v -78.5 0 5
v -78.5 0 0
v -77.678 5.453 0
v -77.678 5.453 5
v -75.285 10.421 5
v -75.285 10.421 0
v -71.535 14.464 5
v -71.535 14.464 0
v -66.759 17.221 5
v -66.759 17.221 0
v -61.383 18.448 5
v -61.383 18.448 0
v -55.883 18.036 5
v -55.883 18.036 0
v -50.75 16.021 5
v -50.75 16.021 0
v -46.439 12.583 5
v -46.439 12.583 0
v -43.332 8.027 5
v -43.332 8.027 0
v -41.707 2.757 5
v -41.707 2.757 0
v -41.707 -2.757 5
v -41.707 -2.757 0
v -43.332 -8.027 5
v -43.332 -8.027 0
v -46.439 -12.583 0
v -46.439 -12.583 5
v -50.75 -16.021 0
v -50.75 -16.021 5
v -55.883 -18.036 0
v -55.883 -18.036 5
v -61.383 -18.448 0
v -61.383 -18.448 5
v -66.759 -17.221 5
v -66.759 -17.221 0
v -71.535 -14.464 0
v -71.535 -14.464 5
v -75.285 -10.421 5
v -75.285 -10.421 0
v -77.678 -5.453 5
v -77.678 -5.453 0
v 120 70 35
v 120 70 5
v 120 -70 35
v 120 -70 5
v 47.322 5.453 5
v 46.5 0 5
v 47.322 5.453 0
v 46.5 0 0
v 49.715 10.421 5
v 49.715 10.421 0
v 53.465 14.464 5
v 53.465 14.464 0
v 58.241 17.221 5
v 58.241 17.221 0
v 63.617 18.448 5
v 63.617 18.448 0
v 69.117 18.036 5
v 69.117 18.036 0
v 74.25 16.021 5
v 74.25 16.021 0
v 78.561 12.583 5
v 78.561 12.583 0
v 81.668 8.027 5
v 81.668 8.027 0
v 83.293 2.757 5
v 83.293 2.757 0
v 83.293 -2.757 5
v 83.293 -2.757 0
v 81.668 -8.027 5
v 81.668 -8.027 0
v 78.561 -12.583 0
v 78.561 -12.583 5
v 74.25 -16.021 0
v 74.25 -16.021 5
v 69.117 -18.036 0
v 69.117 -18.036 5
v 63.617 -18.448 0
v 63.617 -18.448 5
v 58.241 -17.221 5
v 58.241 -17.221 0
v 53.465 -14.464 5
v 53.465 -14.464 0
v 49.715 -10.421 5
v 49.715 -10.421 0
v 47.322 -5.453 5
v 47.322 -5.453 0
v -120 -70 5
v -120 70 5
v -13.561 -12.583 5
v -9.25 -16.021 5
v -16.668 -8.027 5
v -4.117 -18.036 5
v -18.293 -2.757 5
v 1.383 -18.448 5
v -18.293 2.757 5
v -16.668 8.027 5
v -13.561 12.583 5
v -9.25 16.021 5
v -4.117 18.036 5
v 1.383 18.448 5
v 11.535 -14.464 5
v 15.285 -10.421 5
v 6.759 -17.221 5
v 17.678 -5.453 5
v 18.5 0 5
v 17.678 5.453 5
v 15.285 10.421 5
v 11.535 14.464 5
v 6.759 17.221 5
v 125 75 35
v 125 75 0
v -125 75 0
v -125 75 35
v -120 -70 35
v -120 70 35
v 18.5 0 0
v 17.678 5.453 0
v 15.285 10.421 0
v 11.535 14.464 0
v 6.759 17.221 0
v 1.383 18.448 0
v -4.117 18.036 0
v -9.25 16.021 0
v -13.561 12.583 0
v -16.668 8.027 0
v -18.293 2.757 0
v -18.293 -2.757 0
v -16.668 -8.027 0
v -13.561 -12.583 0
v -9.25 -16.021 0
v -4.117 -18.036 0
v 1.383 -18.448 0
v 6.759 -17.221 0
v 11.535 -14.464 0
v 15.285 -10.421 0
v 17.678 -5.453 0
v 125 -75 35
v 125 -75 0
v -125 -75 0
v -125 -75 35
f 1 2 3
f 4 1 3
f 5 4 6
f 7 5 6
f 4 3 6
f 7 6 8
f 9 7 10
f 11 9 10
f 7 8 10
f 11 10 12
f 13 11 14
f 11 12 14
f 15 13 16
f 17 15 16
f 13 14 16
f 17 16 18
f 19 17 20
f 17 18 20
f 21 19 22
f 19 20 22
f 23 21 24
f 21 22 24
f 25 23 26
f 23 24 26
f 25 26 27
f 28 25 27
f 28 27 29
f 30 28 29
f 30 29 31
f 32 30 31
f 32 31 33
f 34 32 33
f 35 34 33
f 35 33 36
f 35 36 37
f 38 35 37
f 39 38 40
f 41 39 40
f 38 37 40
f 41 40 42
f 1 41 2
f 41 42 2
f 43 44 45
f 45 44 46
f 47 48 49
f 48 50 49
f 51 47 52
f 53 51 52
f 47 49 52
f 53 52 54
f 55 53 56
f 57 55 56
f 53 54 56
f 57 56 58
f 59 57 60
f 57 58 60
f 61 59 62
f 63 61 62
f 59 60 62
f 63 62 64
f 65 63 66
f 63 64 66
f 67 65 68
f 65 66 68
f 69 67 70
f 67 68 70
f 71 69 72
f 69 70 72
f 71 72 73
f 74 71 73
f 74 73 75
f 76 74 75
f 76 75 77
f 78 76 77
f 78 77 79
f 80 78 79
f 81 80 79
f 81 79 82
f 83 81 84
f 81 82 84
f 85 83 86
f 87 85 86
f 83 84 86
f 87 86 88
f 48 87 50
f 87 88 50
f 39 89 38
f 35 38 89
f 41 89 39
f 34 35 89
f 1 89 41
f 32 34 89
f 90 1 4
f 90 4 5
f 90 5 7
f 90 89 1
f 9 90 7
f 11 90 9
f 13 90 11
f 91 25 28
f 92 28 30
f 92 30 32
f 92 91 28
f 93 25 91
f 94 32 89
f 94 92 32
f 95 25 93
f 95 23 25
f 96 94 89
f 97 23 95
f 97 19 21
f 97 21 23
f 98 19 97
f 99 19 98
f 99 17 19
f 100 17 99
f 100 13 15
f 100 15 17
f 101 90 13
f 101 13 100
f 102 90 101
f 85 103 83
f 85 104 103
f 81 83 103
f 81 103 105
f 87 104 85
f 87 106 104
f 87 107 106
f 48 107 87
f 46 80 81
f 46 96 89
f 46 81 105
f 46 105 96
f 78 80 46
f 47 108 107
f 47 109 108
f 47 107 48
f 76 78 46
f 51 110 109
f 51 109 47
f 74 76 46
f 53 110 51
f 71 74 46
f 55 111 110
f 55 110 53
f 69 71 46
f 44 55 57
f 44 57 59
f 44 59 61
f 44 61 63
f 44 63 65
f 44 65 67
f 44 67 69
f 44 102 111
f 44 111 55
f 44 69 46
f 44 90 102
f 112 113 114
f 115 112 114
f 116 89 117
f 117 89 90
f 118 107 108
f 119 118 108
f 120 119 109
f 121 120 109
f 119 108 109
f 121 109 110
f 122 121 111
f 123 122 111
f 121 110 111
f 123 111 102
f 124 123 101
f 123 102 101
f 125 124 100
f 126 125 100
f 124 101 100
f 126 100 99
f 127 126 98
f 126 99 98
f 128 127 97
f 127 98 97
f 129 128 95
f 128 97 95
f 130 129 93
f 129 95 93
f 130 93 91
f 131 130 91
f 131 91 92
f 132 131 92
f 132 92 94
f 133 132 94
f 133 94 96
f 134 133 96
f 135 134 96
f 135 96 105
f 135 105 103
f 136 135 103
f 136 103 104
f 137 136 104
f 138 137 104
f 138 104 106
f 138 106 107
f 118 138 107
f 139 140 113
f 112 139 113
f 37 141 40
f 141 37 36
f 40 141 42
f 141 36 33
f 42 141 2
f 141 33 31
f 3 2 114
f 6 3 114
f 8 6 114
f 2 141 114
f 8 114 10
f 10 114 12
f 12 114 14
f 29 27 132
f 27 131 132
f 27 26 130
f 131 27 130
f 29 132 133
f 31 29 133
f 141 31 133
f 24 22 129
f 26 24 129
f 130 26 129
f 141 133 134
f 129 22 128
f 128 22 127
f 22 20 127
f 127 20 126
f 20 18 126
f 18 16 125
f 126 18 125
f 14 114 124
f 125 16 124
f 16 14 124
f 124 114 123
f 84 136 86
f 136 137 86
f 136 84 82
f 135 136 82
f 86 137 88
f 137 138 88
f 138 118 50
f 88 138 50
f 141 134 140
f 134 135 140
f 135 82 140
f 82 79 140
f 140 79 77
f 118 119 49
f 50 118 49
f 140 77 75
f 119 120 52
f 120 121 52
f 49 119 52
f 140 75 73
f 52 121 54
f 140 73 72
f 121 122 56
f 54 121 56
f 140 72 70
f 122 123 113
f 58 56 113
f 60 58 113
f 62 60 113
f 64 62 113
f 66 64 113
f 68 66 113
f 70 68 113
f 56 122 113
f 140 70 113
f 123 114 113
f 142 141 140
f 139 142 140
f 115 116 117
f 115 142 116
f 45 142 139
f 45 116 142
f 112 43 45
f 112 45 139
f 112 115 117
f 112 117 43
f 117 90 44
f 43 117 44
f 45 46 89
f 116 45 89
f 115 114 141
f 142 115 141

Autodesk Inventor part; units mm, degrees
ref_plane "YZ Plane" through (0, 0, 0) normal (1, 0, 0) x (0, 1, 0)
ref_plane "XZ Plane" through (0, 0, 0) normal (0, 1, 0) x (-1, 0, 0)
ref_plane "XY Plane" through (0, 0, 0) normal (0, 0, 1) x (1, 0, 0)
sketch "Sketch1" plane through (0, 0, 0) normal (0, 0, 1) x (1, 0, 0)
  line L0 (-125, -75) -> (125, -75)
  line L1 (125, -75) -> (125, 75)
  line L2 (125, 75) -> (-125, 75)
  line L3 (-125, 75) -> (-125, -75)
  line L4 (-125, -75) -> (125, 75) construction
  line L5 (125, -75) -> (-125, 75) construction
  point P0 (0, 0)
  dimension "d0" = 250
  dimension "d1" = 150
extrude "Extrusion1" add sketch "Sketch1" along normal blind 5
sketch "Sketch2" plane through (0, 0, 5) normal (0, 0, 1) x (1, 0, 0)
  line L0 (125, -75) -> (125, 75) projected
  line L1 (125, 75) -> (-125, 75) projected
  line L2 (-125, 75) -> (-125, -75) projected
  line L3 (-125, -75) -> (125, -75) projected
  line L4 (-120, 70) -> (120, 70)
  line L5 (120, 70) -> (120, -70)
  line L6 (120, -70) -> (-120, -70)
  line L7 (-120, -70) -> (-120, 70)
  point P0 (0, 0)
  dimension "d4" = 5
extrude "Extrusion2" add sketch "Sketch2" along normal blind 30
sketch "Sketch3" plane through (0, 0, 5) normal (0, 0, 1) x (1, 0, 0)
  line L0 (-120, 70) -> (-120, -70) projected
  line L1 (-120, -70) -> (120, -70) projected
  line L2 (120, -70) -> (120, 70) projected
  line L3 (120, 70) -> (-120, 70) projected
  circle A0 centre (0, 0) radius 18.5
  dimension "d8" = 37
extrude "Extrusion3" cut sketch "Sketch3" against normal through all contours A0
sketch "Sketch4" plane through (0, 0, 0) normal (0, 0, -1) x (-1, 0, 0)
  circle A0 centre (-65, 0) radius 18.5
  circle A1 centre (60, 0) radius 18.5
  line L0 (125, 75) -> (125, -75) projected
  line L1 (-125, -75) -> (-125, 75) projected
  line L2 (125, -75) -> (-125, -75) projected
  point P0 (0, 0)
  dimension "d15" = 37
  dimension "d16" = 37
  dimension "d17" = 125
  dimension "d18" = 65
  dimension "d19" = 60
  dimension "d20" = 75
extrude "Extrusion4" cut sketch "Sketch4" against normal through all
sketch "Sketch5" plane through (0, 0, 0) normal (0, 0, -1) x (-1, 0, 0)
  point P0 (0, 0)
properties part number "casing"
